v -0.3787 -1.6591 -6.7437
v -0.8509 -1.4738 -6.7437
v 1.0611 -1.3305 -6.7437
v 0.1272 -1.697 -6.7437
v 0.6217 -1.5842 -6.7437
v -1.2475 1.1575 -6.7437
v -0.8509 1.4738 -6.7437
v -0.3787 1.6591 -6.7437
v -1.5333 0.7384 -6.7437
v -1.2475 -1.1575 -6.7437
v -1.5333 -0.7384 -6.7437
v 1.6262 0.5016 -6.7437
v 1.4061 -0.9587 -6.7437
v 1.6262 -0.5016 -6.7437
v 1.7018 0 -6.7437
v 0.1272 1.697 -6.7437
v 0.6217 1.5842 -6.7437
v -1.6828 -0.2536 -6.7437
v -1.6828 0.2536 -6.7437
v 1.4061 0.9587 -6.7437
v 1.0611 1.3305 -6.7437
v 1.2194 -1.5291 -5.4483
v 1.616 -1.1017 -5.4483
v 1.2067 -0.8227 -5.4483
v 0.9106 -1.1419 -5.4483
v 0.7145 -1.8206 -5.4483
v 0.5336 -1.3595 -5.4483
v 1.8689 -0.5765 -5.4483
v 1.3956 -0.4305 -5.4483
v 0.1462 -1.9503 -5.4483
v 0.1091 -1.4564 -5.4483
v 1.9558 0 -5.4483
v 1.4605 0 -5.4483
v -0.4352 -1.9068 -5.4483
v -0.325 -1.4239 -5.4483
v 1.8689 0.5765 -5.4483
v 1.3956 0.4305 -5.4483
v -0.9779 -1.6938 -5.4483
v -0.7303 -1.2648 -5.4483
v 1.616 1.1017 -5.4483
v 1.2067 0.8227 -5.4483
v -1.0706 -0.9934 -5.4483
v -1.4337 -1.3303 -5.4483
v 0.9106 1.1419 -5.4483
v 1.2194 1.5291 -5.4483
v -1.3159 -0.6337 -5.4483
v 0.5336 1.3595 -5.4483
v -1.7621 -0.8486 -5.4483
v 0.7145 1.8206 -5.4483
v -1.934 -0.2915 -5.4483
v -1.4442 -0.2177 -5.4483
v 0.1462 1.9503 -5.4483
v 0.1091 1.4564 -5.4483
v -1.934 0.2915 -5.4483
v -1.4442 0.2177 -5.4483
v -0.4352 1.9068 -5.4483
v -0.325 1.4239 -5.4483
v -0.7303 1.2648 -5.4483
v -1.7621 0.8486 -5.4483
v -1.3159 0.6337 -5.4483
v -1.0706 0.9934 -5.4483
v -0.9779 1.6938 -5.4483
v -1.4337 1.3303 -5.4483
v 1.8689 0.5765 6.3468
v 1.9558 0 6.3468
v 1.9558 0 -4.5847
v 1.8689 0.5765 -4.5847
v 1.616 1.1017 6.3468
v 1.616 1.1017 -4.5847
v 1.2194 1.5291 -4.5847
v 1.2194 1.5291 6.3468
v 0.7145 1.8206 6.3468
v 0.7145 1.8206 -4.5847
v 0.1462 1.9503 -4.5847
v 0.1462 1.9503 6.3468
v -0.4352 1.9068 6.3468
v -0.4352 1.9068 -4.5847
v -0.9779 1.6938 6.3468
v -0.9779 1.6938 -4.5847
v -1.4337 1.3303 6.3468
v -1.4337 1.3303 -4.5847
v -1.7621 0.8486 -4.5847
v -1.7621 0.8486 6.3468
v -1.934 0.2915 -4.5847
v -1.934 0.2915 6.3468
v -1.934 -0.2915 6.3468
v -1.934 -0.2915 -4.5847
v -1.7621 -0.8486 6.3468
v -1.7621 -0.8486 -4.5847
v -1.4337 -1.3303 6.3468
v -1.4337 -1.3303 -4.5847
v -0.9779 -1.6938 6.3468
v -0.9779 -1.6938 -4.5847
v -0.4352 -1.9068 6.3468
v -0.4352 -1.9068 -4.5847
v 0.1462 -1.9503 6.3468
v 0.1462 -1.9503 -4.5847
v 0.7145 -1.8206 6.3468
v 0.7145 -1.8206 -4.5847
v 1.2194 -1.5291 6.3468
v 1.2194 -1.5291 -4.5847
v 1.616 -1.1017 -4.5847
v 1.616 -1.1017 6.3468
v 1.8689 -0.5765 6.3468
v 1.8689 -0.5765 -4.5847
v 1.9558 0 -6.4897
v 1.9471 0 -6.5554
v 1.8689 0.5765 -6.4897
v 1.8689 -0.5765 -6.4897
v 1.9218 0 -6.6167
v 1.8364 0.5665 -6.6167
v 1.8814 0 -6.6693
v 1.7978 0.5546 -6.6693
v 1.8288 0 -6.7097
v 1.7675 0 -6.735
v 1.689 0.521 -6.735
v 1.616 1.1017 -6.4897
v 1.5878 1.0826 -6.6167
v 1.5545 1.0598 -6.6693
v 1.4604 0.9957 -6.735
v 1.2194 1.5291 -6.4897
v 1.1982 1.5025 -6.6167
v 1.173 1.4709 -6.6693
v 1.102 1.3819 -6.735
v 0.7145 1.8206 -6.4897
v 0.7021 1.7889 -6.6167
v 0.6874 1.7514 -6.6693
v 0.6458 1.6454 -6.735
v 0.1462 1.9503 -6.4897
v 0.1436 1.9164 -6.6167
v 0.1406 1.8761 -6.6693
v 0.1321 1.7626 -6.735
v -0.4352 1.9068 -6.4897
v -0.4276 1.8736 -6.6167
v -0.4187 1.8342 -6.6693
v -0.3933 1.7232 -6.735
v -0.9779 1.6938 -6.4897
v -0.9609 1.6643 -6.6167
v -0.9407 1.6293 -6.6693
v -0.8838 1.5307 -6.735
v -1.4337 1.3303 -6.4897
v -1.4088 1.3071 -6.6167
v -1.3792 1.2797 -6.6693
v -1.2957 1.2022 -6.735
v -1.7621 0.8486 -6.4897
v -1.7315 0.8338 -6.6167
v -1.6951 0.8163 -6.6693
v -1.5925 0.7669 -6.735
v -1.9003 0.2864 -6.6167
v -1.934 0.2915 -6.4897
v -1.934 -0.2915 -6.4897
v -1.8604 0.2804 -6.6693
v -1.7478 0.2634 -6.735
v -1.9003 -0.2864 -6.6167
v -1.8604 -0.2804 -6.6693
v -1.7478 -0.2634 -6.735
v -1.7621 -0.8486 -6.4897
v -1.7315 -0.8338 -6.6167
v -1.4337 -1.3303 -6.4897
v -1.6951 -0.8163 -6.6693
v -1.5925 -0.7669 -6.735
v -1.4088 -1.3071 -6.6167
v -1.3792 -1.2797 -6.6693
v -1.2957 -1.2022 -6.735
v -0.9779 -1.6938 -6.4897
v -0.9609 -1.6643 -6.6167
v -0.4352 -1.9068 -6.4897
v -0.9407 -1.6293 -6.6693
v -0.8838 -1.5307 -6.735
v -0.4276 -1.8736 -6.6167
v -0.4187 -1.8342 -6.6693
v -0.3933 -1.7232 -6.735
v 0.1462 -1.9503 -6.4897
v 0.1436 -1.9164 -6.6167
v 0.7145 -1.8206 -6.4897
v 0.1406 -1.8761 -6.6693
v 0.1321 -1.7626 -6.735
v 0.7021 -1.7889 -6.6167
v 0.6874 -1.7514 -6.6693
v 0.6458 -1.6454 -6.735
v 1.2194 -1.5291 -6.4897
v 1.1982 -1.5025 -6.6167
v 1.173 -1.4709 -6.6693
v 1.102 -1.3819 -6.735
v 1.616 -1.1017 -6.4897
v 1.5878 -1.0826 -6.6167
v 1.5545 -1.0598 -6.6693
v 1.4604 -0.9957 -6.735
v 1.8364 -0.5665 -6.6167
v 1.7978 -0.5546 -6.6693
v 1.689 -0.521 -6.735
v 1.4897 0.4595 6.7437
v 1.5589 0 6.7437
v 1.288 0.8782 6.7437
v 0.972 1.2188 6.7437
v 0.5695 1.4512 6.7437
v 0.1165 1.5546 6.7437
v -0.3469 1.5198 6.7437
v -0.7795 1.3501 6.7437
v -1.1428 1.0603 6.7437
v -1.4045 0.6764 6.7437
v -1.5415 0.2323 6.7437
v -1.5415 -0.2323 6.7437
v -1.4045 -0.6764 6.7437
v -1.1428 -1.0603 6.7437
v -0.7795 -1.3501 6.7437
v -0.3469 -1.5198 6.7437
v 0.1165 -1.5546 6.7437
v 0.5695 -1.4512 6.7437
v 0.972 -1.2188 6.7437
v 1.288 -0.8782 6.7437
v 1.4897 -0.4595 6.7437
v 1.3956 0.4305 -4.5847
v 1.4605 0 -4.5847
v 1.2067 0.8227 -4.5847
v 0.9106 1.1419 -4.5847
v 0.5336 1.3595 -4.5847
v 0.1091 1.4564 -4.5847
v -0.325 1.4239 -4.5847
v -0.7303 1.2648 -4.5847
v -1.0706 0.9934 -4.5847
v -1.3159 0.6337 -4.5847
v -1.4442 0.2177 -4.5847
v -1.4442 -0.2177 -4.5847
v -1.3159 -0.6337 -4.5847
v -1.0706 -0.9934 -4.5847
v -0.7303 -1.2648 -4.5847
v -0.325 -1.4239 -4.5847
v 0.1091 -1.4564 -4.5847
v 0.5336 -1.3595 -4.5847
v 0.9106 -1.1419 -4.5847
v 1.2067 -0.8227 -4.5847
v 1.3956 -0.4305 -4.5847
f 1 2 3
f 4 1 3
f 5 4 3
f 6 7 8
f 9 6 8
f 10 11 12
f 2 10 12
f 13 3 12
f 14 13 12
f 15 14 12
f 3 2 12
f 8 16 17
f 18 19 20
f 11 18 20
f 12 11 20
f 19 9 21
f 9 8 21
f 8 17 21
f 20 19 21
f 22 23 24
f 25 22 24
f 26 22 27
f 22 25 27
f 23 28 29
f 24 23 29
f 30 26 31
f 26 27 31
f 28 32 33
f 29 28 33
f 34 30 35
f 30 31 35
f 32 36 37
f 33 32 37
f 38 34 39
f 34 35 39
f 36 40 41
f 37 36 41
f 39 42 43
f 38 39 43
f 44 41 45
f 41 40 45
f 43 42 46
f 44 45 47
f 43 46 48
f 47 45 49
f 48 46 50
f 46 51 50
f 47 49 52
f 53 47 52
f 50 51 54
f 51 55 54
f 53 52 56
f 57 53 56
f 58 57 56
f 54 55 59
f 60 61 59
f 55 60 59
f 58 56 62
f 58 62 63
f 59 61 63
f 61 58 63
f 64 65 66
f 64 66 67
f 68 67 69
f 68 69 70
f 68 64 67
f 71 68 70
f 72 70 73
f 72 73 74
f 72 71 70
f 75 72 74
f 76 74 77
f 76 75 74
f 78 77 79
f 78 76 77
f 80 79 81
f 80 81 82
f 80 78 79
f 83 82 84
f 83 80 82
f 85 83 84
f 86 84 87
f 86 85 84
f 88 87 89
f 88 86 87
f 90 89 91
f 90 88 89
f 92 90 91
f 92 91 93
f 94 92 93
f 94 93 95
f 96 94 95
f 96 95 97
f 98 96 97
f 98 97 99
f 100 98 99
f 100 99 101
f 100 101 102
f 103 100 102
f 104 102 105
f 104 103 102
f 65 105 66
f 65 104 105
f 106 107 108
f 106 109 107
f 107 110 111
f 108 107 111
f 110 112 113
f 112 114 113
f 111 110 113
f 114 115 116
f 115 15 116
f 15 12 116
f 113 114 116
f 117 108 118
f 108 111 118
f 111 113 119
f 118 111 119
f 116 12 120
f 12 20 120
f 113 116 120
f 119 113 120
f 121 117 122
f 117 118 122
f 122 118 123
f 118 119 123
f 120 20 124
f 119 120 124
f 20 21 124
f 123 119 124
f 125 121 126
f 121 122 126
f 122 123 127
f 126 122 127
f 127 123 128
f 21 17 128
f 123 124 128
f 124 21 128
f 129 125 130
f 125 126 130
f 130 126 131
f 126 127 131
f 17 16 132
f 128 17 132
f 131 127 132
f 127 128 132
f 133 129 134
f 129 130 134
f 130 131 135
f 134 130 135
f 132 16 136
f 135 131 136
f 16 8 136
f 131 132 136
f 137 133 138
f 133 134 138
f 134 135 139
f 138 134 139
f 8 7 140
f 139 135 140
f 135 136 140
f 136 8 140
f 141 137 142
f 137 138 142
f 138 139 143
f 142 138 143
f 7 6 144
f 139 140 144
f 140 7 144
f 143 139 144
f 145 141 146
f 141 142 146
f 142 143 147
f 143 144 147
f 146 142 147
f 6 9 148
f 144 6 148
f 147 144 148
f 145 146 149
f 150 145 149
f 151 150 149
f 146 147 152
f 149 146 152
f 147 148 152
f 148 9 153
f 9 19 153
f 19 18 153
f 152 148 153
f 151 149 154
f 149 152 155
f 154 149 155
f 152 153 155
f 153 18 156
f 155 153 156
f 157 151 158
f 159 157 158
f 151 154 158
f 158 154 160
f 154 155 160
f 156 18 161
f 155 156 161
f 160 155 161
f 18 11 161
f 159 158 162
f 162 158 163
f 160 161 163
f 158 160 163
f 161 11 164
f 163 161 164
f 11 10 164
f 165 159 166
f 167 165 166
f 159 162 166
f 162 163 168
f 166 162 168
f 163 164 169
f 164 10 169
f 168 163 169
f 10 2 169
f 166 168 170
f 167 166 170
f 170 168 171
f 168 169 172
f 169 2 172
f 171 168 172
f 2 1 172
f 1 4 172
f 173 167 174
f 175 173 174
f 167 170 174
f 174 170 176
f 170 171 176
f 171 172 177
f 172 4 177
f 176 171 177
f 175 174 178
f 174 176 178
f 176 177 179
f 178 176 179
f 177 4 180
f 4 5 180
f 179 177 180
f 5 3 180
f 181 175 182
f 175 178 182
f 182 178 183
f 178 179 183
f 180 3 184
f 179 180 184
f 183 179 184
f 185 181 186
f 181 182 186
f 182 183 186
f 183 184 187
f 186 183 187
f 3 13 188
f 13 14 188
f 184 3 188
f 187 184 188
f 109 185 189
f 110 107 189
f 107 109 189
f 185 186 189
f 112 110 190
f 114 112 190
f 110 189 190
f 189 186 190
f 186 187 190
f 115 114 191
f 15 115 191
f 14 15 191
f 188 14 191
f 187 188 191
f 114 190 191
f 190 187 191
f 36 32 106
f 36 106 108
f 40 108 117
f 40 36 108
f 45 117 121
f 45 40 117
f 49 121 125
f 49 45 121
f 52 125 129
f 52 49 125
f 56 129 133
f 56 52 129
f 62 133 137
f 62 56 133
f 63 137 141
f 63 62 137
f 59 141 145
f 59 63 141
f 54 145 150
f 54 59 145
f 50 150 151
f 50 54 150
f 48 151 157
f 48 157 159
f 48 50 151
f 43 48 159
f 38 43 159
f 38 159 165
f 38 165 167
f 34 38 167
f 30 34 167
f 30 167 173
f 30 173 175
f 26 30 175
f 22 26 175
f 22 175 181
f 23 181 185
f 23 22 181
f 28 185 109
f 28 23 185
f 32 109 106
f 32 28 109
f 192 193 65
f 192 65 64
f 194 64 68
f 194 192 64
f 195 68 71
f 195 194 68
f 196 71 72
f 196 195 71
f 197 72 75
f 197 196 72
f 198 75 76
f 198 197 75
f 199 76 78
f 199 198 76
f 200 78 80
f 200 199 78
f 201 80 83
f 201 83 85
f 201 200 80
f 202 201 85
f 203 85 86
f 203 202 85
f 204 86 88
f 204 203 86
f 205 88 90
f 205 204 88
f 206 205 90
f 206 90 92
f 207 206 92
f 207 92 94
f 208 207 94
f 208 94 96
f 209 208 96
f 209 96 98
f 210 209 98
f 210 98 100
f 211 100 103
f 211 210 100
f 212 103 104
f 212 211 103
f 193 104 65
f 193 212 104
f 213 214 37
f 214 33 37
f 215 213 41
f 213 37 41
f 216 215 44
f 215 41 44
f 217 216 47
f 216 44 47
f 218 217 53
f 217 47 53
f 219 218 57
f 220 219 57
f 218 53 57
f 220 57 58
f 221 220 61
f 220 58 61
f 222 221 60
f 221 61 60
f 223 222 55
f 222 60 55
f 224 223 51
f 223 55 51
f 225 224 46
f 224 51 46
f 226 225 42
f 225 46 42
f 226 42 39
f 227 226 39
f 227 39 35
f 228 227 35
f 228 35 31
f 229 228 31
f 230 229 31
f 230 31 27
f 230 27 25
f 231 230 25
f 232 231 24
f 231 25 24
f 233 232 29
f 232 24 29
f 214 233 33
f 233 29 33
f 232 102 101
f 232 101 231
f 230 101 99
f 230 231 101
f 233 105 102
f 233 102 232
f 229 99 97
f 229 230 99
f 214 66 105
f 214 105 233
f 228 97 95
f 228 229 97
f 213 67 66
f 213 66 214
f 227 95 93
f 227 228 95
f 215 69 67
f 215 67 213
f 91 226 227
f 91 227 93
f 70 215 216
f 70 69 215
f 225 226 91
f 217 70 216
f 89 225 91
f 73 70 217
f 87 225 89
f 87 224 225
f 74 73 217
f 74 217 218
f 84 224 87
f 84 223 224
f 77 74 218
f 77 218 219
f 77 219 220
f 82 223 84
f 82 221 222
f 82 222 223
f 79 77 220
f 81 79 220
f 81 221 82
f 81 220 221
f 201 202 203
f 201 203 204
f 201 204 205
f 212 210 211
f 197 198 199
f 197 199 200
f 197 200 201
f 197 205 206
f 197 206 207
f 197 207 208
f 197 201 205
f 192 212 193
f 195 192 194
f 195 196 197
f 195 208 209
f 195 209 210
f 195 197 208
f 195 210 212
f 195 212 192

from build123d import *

# Parameters (mm, degrees)
SKETCH1_R      = 1.9558
EXTRUDE1_DEPTH = 6.7437
SKETCH2_W      = 0.4953
SKETCH2_H      = 0.8636
FILLET1_R      = 0.254
CHAMFER1_SIZE  = 0.396875


with BuildPart() as part:
    # Sketch1 → Extrude1 (new body, symmetric)
    with BuildSketch(Plane.XY):
        Circle(SKETCH1_R)
    extrude(amount=EXTRUDE1_DEPTH, both=True)

    # Sketch2 → Cut-Revolve1 (revolve, cut)
    with BuildSketch(Plane(origin=(0, 0, 0), x_dir=(1, 0, 0), z_dir=(0, 1, 0))):
        with Locations((1.70815, 5.0165)):
            Rectangle(SKETCH2_W, SKETCH2_H)
    revolve(axis=Axis((0, 0, -10.042474892), (0, 0, 1)), mode=Mode.SUBTRACT)

    # Fillet1
    fillet1_edges = [part.edges().sort_by_distance(p)[0] for p in [
        (-1.9558, 0, -6.7437),
    ]]
    fillet(fillet1_edges, radius=FILLET1_R)

    # Chamfer1
    chamfer1_edges = [part.edges().sort_by_distance(p)[0] for p in [
        (-1.9558, 0, 6.7437),
    ]]
    chamfer(chamfer1_edges, length=CHAMFER1_SIZE)


solid = part.part
